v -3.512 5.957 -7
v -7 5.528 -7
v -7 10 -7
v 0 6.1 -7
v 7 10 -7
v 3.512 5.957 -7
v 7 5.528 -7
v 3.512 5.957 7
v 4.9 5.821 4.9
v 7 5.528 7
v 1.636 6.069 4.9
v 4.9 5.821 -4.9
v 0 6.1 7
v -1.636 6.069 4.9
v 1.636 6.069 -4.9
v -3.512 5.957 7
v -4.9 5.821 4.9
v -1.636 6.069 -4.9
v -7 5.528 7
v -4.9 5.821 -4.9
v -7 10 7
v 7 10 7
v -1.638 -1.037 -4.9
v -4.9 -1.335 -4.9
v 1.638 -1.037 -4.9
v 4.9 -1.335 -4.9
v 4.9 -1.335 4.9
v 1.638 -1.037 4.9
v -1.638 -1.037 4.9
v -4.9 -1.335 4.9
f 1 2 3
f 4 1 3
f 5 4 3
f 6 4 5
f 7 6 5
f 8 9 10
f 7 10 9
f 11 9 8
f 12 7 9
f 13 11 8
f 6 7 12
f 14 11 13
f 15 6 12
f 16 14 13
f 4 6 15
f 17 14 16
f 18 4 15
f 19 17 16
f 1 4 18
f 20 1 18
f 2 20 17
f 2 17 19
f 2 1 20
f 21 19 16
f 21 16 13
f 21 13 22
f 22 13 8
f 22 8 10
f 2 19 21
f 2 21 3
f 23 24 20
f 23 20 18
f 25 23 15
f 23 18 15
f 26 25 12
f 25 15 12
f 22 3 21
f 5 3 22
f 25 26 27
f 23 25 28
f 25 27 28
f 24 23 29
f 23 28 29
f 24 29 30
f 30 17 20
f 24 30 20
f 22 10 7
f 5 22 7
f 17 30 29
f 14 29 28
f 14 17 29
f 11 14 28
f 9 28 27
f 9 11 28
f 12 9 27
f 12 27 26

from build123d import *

# Parameters (mm, degrees)
SKETCH1_W               = 14
SKETCH1_H               = 14
BOSS_EXTRUDE1_DEPTH     = 10
SKETCH2_R               = 43.1
CUT_EXTRUDE1_DEPTH      = 8
CUT_EXTRUDE1_DEPTH_BACK = 8
SKETCH3_W               = 9.8
SKETCH3_H               = 9.8
BOSS_EXTRUDE2_DEPTH     = 15
SKETCH5_R               = 36
CUT_EXTRUDE2_DEPTH      = 8
CUT_EXTRUDE2_DEPTH_BACK = 8


with BuildPart() as part:
    # Sketch1 → Boss-Extrude1 (new body)
    with BuildSketch(Plane(origin=(0, 0, 0), x_dir=(1, 0, 0), z_dir=(0, 1, 0))):
        Rectangle(SKETCH1_W, SKETCH1_H)
    extrude(amount=BOSS_EXTRUDE1_DEPTH)

    # Sketch2 → Cut-Extrude1 (cut, two sides)
    with BuildSketch(Plane.XY) as cut_extrude1_sk:
        with Locations((0, -37)):
            Circle(SKETCH2_R)
    extrude(amount=CUT_EXTRUDE1_DEPTH, mode=Mode.SUBTRACT)
    extrude(cut_extrude1_sk.sketch, amount=-CUT_EXTRUDE1_DEPTH_BACK, mode=Mode.SUBTRACT)

    # Sketch3 → Boss-Extrude2 (add)
    with BuildSketch(Plane(origin=(0, 10, 0), x_dir=(1, 0, 0), z_dir=(0, 1, 0))):
        Rectangle(SKETCH3_W, SKETCH3_H)
    extrude(amount=-BOSS_EXTRUDE2_DEPTH)

    # Sketch5 → Cut-Extrude2 (cut, two sides)
    with BuildSketch(Plane.XY) as cut_extrude2_sk:
        with Locations((0, -37)):
            Circle(SKETCH5_R)
    extrude(amount=CUT_EXTRUDE2_DEPTH, mode=Mode.SUBTRACT)
    extrude(cut_extrude2_sk.sketch, amount=-CUT_EXTRUDE2_DEPTH_BACK, mode=Mode.SUBTRACT)


solid = part.part
